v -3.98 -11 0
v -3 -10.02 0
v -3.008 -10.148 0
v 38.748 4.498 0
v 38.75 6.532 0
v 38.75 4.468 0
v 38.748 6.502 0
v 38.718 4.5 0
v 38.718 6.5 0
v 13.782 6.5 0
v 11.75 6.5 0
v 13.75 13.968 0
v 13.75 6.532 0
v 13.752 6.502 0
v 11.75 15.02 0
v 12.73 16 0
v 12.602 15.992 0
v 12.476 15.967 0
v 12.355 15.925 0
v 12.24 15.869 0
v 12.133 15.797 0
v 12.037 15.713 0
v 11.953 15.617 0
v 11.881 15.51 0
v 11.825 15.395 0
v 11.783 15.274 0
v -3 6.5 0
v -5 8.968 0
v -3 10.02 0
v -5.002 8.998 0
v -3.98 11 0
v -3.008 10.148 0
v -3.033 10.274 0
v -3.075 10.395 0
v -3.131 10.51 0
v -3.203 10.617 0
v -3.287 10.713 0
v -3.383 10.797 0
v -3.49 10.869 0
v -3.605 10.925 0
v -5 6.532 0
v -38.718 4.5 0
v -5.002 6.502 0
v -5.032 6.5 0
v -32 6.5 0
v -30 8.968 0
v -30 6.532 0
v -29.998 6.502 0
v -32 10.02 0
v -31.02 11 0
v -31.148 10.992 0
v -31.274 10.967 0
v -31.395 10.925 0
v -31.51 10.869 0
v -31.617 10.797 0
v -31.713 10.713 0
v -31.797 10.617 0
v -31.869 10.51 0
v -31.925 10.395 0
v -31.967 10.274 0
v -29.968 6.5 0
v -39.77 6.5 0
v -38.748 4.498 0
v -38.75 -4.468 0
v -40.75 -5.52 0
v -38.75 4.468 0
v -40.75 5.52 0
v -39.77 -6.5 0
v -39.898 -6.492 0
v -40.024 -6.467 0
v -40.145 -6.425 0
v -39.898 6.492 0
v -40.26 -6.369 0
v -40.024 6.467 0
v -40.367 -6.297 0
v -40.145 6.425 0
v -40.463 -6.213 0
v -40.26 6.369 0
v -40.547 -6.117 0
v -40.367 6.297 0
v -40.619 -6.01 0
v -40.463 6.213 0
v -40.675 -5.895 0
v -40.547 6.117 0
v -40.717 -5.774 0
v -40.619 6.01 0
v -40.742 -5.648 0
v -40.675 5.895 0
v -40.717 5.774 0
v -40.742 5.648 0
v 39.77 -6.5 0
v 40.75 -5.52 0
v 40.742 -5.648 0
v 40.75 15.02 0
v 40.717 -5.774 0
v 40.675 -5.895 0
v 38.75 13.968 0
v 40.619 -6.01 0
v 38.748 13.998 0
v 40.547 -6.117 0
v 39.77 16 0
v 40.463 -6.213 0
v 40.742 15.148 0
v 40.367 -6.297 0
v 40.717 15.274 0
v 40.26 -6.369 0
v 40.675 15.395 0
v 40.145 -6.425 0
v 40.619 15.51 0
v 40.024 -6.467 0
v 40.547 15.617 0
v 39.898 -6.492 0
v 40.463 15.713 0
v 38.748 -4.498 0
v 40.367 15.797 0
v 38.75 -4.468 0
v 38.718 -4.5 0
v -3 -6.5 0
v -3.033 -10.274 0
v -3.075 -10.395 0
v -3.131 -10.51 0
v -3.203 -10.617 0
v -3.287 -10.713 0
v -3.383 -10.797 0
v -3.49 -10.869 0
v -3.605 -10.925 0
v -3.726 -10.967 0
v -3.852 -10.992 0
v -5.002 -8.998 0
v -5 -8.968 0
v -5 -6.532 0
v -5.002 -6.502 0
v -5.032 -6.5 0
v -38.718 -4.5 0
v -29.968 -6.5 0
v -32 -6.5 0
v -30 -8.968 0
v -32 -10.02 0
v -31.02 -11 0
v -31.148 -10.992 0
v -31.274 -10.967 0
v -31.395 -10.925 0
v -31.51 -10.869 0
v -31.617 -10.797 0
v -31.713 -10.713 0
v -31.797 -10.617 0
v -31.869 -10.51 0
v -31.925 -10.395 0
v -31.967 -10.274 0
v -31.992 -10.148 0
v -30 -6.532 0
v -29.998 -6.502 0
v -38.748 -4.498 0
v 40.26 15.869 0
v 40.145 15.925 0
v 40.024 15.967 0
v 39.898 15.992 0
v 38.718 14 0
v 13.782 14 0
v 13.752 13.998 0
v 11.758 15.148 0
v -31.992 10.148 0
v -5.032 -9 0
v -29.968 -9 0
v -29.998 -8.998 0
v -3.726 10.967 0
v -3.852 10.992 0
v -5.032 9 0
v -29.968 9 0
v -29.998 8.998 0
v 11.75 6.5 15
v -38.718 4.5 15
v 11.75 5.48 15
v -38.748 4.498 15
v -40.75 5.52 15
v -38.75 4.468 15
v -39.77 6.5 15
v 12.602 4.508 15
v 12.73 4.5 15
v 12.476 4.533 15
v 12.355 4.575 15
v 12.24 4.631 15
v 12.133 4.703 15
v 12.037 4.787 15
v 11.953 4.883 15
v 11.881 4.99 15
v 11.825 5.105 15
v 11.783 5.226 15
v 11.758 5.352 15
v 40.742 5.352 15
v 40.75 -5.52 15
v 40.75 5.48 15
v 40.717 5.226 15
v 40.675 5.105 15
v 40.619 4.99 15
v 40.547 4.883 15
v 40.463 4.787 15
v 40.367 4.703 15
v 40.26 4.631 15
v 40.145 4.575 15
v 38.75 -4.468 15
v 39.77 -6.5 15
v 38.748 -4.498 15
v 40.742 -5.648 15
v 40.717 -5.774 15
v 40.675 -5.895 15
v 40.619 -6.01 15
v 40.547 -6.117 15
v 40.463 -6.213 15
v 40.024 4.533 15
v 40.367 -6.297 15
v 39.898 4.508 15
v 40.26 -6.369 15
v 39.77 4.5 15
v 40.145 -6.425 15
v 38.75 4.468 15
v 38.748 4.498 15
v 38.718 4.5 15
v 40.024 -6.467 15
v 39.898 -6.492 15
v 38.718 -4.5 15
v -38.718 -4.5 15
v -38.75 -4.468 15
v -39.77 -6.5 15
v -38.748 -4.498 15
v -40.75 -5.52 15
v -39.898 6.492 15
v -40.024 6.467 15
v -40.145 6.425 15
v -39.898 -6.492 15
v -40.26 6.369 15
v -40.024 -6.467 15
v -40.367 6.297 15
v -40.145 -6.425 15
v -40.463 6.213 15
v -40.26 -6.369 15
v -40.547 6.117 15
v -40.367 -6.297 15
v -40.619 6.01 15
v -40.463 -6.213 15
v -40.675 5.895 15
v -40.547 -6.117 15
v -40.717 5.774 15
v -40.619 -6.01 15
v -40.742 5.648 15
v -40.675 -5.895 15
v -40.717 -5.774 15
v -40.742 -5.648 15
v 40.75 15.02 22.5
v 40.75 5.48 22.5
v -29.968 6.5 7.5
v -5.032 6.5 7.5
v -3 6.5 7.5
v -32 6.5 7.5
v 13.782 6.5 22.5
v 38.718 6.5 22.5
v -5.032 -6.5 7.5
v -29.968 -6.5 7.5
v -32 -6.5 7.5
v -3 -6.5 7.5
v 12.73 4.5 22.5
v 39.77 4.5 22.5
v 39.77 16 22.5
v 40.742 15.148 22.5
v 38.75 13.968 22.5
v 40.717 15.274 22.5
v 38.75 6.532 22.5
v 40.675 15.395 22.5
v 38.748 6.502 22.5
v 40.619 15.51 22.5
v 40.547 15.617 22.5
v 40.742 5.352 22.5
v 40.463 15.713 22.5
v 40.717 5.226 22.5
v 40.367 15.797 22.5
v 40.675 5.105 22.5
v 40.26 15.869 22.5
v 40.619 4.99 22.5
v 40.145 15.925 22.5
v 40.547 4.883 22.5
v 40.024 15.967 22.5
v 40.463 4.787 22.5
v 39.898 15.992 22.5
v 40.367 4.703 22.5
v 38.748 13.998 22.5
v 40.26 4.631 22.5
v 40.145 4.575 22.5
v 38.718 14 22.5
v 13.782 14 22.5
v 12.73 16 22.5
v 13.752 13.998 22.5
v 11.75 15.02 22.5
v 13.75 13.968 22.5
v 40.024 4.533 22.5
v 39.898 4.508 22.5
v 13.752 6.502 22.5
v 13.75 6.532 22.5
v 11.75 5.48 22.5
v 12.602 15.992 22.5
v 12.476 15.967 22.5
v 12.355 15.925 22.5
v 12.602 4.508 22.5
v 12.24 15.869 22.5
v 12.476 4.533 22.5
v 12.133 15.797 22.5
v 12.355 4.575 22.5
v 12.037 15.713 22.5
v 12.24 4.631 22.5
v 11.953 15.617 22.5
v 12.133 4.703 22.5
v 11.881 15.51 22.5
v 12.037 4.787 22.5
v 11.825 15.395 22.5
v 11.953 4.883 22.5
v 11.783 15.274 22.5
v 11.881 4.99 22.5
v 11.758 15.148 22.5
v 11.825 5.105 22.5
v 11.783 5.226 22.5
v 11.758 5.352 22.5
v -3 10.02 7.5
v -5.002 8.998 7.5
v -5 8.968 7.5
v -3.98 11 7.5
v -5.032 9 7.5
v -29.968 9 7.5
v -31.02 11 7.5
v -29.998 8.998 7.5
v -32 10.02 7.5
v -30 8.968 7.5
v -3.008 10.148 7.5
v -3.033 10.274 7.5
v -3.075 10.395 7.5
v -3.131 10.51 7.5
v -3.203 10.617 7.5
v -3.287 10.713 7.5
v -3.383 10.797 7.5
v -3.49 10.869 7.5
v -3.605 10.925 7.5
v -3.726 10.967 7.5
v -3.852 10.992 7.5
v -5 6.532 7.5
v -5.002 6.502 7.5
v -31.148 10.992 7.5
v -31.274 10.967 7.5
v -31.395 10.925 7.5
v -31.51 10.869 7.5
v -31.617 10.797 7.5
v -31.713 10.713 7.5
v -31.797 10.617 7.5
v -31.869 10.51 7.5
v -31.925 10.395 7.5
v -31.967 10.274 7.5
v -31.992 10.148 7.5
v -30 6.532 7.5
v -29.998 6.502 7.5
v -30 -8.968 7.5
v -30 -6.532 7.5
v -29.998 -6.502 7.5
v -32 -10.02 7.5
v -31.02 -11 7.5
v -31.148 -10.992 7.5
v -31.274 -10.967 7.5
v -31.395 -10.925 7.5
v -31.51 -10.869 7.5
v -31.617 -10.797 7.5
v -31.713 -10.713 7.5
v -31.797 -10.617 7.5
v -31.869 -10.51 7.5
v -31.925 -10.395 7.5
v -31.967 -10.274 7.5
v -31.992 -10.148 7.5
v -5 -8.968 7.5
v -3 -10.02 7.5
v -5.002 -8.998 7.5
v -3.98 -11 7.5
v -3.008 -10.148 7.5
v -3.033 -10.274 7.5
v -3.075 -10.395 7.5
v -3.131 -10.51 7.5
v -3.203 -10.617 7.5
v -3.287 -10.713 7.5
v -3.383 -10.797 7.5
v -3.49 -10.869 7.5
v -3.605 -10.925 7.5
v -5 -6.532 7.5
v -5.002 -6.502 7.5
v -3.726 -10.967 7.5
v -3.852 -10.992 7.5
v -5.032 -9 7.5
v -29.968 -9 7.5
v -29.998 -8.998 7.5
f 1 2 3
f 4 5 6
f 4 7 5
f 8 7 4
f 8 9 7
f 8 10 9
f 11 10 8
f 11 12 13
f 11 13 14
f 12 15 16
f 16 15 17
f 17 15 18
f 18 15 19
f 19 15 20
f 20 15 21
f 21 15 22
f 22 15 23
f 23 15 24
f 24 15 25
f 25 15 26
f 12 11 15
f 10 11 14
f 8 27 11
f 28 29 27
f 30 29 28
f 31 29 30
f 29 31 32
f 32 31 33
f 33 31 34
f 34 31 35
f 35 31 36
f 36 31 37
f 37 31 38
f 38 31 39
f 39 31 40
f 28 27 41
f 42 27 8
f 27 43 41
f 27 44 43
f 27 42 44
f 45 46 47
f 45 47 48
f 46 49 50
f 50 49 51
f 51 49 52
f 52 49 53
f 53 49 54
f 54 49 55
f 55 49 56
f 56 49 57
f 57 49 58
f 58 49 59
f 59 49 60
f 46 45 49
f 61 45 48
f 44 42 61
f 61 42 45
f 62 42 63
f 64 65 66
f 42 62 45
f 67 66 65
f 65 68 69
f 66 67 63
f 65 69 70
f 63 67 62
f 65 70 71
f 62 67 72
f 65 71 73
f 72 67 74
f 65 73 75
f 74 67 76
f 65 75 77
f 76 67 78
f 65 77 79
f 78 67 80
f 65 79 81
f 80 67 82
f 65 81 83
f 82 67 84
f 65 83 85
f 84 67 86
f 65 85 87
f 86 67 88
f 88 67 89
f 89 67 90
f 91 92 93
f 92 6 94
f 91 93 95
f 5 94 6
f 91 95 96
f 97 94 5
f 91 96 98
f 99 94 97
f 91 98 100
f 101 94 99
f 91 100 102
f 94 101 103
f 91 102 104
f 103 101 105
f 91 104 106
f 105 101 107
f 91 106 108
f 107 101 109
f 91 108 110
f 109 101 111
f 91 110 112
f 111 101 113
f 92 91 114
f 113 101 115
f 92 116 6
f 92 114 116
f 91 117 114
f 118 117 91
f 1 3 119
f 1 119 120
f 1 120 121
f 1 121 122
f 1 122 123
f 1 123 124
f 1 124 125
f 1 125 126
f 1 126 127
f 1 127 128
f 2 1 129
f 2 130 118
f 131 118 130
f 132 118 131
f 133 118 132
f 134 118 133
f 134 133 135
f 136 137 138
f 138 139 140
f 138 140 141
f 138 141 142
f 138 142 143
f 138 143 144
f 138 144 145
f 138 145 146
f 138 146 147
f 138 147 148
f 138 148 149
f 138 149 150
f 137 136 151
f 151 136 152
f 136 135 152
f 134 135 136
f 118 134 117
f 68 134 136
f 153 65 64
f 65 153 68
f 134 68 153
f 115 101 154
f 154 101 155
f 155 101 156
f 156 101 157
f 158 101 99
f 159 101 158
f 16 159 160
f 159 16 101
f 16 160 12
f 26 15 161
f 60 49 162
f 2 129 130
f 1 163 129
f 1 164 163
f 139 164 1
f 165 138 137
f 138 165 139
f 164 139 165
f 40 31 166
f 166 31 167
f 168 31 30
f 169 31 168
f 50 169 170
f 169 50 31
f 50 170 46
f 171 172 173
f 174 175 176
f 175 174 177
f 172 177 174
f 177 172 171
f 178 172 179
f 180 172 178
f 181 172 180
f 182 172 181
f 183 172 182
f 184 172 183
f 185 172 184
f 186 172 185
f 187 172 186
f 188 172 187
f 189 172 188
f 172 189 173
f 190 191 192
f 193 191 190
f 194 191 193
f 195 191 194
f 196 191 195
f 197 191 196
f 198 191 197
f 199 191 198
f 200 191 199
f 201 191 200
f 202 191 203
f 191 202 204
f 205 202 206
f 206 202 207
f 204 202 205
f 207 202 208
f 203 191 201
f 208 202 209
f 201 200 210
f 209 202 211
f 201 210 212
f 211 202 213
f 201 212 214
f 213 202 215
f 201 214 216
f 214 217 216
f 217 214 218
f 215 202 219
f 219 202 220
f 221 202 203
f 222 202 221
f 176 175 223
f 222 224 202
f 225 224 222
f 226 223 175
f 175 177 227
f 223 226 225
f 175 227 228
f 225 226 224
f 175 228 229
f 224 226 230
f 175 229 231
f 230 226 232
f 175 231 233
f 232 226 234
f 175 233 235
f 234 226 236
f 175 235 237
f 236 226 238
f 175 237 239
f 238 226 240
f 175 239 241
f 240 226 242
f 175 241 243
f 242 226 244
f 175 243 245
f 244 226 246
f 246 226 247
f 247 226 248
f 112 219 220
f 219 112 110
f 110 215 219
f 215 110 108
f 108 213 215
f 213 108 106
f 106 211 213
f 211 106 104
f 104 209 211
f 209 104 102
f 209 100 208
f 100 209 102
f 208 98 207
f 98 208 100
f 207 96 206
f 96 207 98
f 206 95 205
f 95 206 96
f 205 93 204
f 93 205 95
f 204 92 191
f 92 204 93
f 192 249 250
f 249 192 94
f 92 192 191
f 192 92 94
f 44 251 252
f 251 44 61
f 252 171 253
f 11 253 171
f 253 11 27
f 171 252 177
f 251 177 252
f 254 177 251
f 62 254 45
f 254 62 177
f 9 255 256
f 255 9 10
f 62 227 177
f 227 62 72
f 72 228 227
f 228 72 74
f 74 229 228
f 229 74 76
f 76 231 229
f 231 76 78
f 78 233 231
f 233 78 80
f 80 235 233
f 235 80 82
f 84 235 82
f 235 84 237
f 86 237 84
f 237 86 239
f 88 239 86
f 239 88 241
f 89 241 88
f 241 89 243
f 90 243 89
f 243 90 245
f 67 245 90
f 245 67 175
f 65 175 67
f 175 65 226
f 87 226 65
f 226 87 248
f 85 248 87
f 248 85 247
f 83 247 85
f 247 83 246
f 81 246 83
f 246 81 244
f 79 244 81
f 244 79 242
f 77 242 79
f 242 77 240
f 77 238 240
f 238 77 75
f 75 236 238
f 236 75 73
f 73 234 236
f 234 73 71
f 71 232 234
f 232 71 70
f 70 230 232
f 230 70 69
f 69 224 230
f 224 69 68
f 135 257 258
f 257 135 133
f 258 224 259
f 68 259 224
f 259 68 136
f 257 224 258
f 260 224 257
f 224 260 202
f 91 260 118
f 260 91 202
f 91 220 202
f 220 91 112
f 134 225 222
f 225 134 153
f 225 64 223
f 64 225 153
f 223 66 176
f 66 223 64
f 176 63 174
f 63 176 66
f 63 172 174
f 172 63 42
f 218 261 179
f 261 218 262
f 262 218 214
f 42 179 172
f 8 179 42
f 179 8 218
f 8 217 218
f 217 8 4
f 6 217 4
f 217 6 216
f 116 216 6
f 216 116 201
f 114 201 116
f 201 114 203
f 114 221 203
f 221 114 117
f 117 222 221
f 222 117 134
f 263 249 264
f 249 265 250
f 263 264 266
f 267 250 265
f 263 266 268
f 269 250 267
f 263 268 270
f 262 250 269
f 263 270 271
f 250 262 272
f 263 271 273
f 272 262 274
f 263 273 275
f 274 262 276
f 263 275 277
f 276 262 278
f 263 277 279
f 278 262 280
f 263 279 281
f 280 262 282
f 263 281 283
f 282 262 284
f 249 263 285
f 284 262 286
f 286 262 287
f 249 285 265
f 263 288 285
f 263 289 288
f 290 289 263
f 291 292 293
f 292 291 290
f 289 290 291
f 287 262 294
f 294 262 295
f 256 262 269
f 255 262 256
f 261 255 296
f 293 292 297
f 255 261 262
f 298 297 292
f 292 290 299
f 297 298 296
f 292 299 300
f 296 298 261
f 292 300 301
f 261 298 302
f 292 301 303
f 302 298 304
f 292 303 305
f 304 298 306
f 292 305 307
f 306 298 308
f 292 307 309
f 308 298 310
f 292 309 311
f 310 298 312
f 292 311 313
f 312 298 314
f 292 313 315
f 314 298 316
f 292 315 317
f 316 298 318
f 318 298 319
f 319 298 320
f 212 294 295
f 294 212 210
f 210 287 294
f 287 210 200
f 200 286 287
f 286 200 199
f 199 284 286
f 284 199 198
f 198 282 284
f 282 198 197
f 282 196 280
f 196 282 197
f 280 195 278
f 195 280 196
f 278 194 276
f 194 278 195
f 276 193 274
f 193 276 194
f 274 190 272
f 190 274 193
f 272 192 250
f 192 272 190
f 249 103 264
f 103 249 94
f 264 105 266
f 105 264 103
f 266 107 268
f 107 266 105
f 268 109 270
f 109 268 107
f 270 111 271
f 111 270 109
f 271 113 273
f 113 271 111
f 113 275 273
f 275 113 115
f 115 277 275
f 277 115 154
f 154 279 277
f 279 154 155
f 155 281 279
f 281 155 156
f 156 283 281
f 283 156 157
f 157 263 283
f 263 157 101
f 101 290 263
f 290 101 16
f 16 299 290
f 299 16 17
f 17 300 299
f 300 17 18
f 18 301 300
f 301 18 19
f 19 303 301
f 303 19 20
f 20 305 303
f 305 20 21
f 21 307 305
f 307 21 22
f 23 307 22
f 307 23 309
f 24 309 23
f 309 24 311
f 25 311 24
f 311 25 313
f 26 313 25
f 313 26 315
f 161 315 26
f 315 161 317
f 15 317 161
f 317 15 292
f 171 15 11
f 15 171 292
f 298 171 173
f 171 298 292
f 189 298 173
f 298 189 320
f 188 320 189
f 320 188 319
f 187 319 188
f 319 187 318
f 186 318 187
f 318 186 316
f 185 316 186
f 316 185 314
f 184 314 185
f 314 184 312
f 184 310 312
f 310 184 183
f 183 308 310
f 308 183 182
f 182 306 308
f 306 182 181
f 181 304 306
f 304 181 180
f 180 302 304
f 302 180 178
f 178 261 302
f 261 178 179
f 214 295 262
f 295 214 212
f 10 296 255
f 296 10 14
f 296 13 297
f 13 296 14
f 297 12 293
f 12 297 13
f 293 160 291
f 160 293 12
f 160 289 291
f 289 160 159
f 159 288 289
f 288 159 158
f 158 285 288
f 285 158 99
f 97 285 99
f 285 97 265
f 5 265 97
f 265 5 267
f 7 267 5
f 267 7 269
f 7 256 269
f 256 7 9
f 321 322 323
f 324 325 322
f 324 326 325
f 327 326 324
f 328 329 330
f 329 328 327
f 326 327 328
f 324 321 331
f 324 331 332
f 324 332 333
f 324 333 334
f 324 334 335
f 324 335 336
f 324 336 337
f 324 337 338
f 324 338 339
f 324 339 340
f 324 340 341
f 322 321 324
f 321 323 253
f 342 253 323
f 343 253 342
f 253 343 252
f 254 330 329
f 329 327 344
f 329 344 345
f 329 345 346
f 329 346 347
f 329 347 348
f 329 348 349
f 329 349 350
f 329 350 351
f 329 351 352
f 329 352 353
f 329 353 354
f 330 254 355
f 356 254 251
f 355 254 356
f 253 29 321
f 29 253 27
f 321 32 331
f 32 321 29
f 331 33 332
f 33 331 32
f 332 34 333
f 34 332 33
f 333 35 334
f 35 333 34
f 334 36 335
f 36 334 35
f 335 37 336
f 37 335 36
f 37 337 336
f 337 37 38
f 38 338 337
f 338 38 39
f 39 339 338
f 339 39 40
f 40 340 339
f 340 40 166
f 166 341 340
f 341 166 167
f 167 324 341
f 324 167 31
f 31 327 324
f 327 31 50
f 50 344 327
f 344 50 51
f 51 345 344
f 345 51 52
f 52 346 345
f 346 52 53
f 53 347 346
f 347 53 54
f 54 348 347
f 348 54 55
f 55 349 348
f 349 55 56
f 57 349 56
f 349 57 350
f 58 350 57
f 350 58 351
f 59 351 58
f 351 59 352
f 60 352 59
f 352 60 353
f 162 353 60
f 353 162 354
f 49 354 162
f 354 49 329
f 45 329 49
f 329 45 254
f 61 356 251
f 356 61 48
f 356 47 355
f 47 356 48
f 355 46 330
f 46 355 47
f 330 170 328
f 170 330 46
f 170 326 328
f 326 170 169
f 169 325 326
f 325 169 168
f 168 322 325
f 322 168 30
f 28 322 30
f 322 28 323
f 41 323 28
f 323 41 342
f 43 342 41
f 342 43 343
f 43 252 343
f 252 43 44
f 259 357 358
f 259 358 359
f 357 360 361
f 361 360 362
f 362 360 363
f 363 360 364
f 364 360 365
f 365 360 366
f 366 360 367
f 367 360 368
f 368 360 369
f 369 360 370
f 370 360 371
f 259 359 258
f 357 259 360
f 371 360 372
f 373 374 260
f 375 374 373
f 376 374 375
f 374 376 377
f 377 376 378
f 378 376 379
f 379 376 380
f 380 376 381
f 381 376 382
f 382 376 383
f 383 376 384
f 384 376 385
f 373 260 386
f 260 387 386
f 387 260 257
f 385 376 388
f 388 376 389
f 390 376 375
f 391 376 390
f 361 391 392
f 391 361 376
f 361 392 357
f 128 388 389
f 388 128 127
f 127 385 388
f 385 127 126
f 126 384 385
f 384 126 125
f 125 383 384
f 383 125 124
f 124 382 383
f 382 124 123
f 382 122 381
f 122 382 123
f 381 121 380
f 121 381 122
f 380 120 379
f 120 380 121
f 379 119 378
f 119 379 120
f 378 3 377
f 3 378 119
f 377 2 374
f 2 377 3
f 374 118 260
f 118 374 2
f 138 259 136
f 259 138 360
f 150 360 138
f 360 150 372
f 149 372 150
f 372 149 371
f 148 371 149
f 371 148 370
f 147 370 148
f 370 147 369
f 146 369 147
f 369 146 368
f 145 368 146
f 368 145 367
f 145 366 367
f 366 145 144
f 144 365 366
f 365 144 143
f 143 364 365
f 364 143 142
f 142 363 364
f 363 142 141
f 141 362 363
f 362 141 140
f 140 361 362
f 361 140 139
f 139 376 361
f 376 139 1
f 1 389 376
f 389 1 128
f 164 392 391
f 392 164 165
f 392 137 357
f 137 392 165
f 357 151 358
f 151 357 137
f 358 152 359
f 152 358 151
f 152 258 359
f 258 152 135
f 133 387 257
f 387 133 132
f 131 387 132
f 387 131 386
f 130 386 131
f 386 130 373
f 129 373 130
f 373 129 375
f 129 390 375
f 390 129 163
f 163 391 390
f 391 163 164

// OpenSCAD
thickness = 2;
height = 15;

hole_phone = [77.5, 9];
hole_holster = [25, 7.5];
hole_strap = [25, 2.5];


module bracket(hole, thickness, height) {
    $fn = 48;
    rounding = thickness * 0.49;

    linear_extrude(height)
    offset(rounding)
    offset(- rounding)
    difference() {
        square([
            hole.x + thickness * 2,
            hole.y + thickness * 2,
        ], center = true);

        square(hole, center = true);
    }
}


bracket(hole_phone, thickness, height);

translate([
    hole_phone.x / 2 - hole_holster.x / 2,
    (hole_phone.y + hole_holster.y) / 2 + thickness,
    0,
])
bracket(hole_holster, thickness, height * 1.5);

translate([
    - hole_phone.x / 3 + hole_strap.x / 3,
    (hole_phone.y + hole_strap.y) / 2 + thickness,
    0,
])
bracket(hole_strap, thickness, height / 2);

translate([
    - hole_phone.x / 3 + hole_strap.x / 3,
    - (hole_phone.y + hole_strap.y) / 2 - thickness,
    0,
])
bracket(hole_strap, thickness, height / 2);
